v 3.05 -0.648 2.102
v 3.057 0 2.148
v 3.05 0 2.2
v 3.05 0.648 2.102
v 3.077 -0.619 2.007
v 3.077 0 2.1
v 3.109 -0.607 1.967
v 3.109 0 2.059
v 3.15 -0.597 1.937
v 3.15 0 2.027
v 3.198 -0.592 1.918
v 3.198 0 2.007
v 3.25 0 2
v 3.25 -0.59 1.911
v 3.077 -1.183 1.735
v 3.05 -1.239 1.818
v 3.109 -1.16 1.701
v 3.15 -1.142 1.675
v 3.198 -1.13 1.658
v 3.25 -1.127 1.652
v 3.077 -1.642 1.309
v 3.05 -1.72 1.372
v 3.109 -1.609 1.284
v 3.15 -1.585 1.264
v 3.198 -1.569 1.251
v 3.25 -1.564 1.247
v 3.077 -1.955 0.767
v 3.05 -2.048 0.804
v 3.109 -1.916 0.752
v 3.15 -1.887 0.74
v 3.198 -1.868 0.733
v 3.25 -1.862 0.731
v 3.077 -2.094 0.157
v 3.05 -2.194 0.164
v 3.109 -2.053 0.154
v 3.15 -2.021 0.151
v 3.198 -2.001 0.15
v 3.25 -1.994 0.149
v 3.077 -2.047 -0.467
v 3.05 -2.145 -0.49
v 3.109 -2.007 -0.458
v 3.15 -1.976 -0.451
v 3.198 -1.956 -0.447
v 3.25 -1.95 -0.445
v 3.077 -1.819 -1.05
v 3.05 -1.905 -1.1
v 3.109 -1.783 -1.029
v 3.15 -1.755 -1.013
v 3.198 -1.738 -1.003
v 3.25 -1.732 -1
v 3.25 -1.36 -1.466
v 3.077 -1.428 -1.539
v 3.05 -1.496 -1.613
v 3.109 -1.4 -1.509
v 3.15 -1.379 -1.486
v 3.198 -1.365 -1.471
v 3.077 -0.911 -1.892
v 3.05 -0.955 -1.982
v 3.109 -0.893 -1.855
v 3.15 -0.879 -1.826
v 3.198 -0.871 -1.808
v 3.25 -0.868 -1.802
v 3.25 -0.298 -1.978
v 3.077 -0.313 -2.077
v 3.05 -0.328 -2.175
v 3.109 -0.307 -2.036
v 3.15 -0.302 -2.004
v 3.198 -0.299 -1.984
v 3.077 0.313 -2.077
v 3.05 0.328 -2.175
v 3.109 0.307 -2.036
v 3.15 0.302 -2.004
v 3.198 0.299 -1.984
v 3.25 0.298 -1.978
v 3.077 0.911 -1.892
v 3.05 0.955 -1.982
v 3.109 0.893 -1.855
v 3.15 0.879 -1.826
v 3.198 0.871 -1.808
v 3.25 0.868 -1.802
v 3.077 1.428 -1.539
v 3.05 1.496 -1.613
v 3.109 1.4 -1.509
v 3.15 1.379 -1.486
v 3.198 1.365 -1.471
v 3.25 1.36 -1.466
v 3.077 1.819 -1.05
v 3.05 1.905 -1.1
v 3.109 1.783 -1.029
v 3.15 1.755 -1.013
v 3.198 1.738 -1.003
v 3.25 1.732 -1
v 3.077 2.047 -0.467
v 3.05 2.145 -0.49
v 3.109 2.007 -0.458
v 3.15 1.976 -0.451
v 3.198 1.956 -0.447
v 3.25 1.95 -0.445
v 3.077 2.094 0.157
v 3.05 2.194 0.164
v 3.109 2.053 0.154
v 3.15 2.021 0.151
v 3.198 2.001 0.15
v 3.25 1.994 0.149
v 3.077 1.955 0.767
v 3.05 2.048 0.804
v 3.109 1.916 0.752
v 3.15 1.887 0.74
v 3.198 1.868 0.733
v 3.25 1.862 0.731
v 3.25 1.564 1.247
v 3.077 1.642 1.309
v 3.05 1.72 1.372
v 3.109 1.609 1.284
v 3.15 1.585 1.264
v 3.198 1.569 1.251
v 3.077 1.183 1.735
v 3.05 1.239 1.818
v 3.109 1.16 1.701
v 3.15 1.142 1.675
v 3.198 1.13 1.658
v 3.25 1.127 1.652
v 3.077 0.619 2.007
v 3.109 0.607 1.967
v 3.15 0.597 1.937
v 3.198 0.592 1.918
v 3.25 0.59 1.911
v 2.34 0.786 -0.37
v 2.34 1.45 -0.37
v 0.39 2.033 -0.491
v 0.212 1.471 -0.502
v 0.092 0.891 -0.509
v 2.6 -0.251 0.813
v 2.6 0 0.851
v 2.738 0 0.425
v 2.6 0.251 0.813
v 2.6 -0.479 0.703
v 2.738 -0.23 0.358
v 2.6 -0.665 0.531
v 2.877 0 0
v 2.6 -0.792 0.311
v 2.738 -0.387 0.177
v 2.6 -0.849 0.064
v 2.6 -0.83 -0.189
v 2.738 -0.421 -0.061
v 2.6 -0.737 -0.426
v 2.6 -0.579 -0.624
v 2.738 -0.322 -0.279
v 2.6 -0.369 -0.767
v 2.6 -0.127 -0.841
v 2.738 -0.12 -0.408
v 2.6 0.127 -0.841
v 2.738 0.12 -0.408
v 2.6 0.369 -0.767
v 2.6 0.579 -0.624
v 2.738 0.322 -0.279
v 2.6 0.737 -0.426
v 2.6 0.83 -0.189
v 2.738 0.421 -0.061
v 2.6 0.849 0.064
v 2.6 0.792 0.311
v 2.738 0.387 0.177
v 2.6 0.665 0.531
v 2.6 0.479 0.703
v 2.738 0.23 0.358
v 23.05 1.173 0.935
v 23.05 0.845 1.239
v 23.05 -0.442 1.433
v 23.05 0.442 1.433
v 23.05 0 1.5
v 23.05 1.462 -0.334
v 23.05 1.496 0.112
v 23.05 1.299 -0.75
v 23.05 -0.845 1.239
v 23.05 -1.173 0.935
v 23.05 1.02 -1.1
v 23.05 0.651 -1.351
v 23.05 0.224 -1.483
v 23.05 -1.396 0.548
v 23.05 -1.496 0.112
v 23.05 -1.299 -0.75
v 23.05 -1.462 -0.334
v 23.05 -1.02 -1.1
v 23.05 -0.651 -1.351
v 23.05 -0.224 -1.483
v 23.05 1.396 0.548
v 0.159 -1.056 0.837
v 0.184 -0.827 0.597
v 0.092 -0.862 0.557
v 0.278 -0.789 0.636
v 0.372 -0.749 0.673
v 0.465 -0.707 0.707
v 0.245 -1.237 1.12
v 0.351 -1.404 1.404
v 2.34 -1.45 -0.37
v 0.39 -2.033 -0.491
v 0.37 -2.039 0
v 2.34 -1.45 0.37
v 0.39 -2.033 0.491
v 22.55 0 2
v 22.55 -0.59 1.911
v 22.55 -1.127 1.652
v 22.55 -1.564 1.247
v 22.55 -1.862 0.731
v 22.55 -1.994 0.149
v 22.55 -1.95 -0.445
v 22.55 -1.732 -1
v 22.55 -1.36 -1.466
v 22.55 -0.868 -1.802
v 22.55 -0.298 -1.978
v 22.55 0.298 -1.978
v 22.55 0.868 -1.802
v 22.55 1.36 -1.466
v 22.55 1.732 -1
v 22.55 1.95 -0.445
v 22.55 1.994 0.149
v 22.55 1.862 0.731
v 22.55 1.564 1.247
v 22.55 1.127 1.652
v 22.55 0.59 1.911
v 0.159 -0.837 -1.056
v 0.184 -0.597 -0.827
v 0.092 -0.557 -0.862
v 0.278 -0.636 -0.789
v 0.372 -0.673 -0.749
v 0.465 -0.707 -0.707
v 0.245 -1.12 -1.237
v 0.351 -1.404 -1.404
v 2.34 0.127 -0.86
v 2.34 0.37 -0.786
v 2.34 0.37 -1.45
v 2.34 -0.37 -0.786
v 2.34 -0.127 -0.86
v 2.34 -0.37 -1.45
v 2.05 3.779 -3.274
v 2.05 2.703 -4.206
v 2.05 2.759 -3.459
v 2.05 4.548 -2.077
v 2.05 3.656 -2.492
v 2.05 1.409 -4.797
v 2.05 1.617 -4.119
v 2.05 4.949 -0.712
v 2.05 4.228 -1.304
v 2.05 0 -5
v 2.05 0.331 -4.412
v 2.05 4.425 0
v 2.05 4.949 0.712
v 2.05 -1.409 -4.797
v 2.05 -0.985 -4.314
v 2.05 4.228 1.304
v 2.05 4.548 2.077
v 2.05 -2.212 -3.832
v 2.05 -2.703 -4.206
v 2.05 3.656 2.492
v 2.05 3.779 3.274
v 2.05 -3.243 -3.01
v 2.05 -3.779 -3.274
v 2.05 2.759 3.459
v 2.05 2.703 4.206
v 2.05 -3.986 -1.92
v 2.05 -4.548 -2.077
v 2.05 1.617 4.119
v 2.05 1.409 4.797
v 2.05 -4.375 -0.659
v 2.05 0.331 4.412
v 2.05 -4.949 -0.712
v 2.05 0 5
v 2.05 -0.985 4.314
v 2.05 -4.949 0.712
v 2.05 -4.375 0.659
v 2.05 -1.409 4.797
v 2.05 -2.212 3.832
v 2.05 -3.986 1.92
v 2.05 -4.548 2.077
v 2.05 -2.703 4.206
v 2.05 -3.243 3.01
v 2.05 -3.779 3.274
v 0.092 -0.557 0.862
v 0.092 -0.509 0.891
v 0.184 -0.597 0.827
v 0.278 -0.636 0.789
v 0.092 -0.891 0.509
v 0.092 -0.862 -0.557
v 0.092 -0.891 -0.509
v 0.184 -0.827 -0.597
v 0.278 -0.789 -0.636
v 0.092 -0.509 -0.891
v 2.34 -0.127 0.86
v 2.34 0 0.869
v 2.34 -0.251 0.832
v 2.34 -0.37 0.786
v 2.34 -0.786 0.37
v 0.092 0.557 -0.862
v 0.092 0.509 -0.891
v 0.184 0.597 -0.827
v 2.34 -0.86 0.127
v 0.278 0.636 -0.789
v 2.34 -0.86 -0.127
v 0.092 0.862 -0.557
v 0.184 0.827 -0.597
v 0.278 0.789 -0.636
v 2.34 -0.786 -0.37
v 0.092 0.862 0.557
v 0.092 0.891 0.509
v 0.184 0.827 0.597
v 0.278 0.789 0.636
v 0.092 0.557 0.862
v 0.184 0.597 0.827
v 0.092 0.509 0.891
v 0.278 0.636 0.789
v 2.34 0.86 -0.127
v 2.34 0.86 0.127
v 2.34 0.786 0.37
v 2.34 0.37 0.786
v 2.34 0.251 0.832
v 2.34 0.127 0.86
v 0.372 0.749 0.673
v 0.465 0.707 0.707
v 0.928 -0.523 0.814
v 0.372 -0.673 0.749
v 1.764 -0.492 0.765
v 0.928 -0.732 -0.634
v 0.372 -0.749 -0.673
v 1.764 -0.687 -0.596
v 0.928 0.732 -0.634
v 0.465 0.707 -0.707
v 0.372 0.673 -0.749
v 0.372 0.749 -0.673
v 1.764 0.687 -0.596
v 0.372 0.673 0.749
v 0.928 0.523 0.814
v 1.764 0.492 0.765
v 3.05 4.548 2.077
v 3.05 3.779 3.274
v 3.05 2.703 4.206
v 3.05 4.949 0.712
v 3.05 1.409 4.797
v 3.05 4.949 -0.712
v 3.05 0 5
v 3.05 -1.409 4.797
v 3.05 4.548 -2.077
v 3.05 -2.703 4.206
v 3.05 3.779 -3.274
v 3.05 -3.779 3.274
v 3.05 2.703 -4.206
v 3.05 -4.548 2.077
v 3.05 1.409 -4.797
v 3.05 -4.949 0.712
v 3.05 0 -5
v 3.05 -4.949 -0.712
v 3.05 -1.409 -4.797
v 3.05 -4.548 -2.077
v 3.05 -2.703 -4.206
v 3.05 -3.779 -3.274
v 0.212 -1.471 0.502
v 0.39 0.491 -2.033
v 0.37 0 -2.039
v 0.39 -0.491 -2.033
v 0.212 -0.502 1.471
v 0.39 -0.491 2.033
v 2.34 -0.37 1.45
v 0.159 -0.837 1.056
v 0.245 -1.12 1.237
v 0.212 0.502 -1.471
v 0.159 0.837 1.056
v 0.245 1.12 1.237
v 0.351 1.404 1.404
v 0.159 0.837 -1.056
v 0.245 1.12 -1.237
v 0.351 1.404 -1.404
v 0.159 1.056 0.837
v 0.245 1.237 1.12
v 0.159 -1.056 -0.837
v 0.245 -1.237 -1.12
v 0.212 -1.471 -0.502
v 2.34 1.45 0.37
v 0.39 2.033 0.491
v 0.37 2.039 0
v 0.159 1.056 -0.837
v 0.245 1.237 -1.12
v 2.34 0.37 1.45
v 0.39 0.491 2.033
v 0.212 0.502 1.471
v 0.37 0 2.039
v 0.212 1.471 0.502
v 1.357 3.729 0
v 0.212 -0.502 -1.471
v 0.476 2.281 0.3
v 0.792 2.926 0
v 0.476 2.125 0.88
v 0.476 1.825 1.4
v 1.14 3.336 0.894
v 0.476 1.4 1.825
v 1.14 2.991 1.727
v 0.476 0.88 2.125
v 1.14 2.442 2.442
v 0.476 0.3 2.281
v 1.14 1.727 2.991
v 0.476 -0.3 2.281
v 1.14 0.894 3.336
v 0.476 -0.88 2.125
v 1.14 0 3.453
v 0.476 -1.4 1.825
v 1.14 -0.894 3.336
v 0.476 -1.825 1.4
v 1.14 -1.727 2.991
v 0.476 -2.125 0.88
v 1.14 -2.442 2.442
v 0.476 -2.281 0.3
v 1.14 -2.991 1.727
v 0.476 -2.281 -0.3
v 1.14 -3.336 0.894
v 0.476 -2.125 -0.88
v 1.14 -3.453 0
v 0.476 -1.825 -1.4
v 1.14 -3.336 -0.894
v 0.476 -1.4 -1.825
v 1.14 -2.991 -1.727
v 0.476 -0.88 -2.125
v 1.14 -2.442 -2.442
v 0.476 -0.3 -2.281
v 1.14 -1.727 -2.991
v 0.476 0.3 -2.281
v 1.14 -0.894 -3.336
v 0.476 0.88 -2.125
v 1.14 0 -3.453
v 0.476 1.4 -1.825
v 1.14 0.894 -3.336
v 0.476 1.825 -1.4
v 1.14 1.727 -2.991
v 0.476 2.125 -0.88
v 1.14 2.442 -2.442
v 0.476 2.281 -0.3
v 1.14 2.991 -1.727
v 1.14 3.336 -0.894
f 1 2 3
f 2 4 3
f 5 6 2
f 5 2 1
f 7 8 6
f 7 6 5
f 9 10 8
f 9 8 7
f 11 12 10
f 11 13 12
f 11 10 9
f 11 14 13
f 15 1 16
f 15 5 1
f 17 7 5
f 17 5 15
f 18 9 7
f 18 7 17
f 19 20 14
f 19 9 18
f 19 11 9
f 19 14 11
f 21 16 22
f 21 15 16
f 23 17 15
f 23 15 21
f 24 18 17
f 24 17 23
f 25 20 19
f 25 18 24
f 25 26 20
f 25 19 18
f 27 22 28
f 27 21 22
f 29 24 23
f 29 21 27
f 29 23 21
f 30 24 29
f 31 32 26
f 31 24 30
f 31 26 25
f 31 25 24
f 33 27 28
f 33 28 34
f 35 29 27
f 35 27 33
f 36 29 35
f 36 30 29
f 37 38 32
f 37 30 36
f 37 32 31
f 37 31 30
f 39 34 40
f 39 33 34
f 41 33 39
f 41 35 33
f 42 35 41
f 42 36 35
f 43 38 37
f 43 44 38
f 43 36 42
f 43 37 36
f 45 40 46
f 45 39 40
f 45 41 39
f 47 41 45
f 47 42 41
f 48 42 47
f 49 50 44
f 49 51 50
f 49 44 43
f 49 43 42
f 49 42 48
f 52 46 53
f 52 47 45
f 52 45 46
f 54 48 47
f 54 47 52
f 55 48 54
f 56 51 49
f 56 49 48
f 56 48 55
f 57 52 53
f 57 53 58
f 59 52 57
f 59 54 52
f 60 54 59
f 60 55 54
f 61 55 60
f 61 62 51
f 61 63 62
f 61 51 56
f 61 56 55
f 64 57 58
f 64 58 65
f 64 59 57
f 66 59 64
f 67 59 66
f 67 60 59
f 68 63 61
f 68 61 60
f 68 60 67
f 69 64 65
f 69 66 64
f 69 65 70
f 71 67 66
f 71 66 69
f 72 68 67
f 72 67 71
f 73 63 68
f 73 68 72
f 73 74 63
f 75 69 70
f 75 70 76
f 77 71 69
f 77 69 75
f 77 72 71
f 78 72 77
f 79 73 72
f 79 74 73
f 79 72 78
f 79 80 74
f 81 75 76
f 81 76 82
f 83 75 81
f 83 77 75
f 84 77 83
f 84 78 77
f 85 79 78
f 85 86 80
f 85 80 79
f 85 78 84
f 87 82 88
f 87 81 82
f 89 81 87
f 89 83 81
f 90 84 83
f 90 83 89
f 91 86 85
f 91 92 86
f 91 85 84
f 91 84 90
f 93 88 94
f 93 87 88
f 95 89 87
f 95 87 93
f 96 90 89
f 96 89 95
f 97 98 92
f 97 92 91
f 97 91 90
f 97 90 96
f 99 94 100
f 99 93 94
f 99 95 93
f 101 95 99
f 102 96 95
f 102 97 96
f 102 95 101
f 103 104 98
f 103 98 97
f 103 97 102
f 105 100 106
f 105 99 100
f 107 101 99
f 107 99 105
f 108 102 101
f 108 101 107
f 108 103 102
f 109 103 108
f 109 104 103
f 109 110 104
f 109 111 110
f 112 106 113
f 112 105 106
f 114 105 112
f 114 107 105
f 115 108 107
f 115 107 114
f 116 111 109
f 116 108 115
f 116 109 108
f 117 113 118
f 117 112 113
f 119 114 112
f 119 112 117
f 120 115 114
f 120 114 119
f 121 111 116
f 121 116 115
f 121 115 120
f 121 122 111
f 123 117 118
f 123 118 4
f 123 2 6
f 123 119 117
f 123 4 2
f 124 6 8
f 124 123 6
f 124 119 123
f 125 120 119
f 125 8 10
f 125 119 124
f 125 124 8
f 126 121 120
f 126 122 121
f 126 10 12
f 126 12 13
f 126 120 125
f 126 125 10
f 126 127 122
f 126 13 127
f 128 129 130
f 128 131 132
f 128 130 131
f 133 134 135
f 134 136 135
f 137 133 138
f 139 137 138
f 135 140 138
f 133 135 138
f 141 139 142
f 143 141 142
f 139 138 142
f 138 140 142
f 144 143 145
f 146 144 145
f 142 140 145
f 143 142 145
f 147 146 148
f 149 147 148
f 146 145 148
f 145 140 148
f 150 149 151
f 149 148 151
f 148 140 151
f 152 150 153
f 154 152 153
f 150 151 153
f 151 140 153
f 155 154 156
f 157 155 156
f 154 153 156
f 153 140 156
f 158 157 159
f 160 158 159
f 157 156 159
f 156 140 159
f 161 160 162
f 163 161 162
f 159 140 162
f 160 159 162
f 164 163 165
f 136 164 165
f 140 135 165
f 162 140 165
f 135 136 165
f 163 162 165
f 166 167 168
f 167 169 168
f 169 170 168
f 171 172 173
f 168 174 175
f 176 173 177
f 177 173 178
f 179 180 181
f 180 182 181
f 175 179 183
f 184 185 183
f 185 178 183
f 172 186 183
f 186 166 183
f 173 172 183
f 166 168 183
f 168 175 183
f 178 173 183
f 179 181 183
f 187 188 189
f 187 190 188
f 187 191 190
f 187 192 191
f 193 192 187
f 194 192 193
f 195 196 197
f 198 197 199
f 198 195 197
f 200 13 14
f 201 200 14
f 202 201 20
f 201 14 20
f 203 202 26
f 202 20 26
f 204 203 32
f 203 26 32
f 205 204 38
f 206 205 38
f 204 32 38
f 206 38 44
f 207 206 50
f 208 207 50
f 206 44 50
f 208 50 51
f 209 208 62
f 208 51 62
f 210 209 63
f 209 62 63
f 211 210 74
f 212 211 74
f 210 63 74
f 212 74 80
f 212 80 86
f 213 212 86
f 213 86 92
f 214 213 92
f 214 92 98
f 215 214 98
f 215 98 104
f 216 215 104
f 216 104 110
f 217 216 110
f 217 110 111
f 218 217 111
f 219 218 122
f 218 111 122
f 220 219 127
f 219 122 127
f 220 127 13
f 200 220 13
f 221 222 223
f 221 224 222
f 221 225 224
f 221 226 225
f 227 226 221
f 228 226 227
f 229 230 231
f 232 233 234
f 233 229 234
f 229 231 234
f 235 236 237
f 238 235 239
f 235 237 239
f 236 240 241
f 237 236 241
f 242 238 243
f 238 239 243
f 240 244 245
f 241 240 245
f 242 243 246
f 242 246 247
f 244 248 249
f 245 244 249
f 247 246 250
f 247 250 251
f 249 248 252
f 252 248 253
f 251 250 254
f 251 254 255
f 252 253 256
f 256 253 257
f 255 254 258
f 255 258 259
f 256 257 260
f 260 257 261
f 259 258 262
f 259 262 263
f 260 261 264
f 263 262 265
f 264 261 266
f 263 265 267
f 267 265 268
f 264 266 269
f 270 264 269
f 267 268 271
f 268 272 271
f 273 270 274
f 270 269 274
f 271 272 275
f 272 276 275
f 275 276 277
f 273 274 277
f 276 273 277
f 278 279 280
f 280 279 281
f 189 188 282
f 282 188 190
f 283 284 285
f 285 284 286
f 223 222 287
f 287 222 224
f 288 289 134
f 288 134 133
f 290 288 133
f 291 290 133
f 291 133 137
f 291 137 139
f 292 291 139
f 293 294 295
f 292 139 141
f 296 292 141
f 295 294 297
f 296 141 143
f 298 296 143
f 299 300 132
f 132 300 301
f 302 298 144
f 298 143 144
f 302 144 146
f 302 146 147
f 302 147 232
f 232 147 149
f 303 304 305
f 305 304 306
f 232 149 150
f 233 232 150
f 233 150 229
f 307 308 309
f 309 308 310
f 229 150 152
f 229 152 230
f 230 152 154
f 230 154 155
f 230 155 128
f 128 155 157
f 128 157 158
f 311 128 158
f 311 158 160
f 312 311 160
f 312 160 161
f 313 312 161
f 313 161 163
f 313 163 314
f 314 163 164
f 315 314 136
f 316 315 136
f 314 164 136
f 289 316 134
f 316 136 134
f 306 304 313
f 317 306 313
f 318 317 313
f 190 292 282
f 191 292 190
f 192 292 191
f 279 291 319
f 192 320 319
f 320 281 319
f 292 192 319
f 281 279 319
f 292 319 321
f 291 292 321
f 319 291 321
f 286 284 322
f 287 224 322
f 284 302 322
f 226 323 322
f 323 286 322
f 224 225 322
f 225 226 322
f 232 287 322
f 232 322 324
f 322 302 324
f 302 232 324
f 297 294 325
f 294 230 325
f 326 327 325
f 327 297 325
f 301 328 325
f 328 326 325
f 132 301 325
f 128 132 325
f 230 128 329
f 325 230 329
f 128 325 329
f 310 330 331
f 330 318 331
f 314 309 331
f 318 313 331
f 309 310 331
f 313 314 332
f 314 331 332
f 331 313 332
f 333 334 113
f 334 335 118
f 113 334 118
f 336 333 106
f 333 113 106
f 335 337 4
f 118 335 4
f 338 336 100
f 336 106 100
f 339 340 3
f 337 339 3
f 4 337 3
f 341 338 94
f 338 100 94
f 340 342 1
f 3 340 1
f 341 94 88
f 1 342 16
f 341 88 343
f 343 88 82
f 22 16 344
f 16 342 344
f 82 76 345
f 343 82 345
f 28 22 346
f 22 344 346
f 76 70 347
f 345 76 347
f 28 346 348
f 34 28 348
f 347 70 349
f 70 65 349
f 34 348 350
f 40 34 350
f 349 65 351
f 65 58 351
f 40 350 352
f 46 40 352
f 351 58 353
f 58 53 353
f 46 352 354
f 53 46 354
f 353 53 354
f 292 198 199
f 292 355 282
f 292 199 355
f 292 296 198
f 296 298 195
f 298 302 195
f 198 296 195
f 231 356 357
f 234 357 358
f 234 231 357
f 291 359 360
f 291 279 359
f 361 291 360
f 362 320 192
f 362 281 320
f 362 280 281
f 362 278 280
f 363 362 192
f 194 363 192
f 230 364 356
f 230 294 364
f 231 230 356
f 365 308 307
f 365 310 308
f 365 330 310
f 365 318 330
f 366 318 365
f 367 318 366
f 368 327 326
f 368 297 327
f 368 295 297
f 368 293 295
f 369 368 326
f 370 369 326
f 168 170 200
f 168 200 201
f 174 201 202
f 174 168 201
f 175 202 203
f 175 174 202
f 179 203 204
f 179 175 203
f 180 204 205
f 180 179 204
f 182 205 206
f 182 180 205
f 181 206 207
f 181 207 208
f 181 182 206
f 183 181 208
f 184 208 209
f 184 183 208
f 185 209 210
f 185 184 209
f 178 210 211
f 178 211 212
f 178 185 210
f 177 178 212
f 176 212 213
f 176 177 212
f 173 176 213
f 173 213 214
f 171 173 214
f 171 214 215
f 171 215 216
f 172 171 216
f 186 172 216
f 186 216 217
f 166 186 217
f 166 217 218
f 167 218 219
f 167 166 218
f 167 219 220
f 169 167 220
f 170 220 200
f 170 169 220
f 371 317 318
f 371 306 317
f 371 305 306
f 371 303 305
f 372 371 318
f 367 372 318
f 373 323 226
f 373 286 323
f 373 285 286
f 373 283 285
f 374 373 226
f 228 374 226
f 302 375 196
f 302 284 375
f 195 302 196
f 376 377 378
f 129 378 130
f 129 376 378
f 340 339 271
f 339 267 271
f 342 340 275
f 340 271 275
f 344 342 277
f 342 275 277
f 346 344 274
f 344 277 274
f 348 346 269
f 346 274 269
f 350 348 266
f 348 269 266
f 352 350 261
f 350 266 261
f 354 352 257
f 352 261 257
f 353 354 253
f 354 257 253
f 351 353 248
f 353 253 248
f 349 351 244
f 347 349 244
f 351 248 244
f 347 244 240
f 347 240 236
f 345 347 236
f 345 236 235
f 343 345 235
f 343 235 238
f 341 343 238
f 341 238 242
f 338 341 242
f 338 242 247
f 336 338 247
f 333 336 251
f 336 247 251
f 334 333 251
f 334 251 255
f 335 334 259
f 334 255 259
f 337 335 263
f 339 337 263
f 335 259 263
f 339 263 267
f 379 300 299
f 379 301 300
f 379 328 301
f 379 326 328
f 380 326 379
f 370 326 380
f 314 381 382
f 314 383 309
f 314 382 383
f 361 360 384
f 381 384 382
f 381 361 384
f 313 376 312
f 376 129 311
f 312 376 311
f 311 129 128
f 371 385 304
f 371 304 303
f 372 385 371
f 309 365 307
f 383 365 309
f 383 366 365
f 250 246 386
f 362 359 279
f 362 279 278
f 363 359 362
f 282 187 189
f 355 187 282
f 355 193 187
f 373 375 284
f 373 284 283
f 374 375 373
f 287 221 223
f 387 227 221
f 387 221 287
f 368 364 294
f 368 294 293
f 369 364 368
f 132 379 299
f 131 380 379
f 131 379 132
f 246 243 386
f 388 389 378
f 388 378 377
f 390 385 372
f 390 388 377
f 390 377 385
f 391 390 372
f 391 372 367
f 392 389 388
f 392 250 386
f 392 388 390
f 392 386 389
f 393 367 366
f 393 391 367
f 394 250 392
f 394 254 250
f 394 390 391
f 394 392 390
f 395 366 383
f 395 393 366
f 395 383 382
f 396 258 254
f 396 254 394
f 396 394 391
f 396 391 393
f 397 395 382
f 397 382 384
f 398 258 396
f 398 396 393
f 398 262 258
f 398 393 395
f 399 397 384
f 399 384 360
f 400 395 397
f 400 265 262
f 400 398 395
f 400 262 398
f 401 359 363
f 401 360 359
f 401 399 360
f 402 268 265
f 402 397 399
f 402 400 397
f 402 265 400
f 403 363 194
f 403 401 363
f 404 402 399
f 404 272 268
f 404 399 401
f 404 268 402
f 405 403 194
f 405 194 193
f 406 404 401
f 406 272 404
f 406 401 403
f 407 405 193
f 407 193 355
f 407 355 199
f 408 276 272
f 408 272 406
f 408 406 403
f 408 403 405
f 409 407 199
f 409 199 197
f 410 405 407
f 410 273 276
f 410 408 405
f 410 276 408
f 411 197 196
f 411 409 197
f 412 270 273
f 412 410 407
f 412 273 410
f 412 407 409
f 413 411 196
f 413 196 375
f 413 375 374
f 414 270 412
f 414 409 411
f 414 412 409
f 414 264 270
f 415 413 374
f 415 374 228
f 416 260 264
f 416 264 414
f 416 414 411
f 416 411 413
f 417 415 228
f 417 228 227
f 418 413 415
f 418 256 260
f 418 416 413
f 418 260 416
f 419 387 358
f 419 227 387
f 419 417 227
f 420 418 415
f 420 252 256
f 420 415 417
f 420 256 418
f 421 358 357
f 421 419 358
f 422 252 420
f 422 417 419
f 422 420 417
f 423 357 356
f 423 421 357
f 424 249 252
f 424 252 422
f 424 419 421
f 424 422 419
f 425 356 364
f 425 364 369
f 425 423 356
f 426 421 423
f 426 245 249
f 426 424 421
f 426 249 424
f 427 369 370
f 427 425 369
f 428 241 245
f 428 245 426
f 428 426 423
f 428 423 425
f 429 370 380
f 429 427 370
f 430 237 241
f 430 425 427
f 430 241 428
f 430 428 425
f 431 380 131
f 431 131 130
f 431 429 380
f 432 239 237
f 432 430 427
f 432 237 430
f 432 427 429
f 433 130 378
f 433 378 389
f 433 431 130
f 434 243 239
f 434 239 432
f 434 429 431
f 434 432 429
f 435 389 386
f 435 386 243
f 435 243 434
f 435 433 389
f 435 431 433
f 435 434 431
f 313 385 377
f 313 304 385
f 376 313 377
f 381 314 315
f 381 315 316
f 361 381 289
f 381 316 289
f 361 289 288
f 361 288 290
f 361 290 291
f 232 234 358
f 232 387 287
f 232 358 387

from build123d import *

# Parameters (mm, degrees)
FILLET1_R             = 0.2
RECPAT_COUNT          = 2
RECPAT_ANGLE          = 90
CHAMFER_1_SIZE        = 0.5
CUT_EXTRUDE_START     = -1.932317225
CUT_EXTRUDE_1_DEPTH   = 0.992538955
CUT_EXTRUDE_1_2_DEPTH = 0.992538955
CUT_EXTRUDE_1_3_DEPTH = 0.992538955
CUT_EXTRUDE_1_4_DEPTH = 0.992538955


# Read off the part's stored shape, not the designer's step: Вытянуть1
with BuildPart() as part:
    # BodySke → Base-Revolve (revolve)
    with BuildSketch(Plane.XY, mode=Mode.PRIVATE) as base_revolve_sk:
        Polygon((3.05, 2), (3.05, 5), (2.05, 5), (2.05, 0), (23.05, 0), (23.05, 2), align=None)
    revolve(base_revolve_sk.sketch.rotate(Axis((-6.35, 0, 0), (1, 0, 0)), 90), axis=Axis((-6.35, 0, 0), (1, 0, 0)))

    # Fillet1
    fillet1_edges = [part.edges().sort_by_distance(p)[0] for p in [
        (3.05, 0, -2),
    ]]
    fillet(fillet1_edges, radius=FILLET1_R)

    # PanSke → Pan (revolve)
    with BuildSketch(Plane.XY):
        with BuildLine():
            Line((2.05, 4.424646879), (2.05, 0))
            Line((2.05, 0), (0, 0))
            ThreePointArc((0, 0), (0.537396082, 2.438237068), (2.05, 4.424646879))
        make_face()
    revolve(axis=Axis((0, 0, 0), (1, 0, 0)))

    # Sketch3 → Recess section 0
    with BuildSketch(Plane(origin=(0, 0, 0), x_dir=(0, 0, -1), z_dir=(1, 0, 0))):
        with BuildLine():
            Line((-0.515, 2.15), (0.515, 2.15))
            Line((0.515, 2.15), (0.515, -2.15))
            Line((0.515, -2.15), (-0.515, -2.15))
            Line((-0.515, -2.15), (-0.515, 2.15))
        make_face()
    # Sketch4 → Recess section 1
    with BuildSketch(Plane(origin=(2.34, 0, 0), x_dir=(0, 0, -1), z_dir=(1, 0, 0))):
        with BuildLine():
            Line((-0.37, 1.45), (0.37, 1.45))
            Line((0.37, 1.45), (0.37, -1.45))
            Line((0.37, -1.45), (-0.37, -1.45))
            Line((-0.37, -1.45), (-0.37, 1.45))
        make_face()
    recess = loft(mode=Mode.SUBTRACT)

    # RecPat: Recess ×2 about axis
    recpat_axis = Axis((0, 0, 0), (1, 0, 0))
    for i in range(1, RECPAT_COUNT):
        add(recess.rotate(recpat_axis, i * RECPAT_ANGLE / (RECPAT_COUNT - 1)), mode=Mode.SUBTRACT)

    # RecCorSke → RecessCore (revolve, cut)
    with BuildSketch(Plane.XY, mode=Mode.PRIVATE) as recesscore_sk:
        Polygon((0, 0), (0, 1.032809711), (2.6, 0.851), (2.876506661, 0), align=None)
    revolve(recesscore_sk.sketch.rotate(Axis((-3.175, 0, 0), (1, 0, 0)), 90), axis=Axis((-3.175, 0, 0), (1, 0, 0)), mode=Mode.SUBTRACT)

    # Фаска1
    chamfer_1_edges = [part.edges().sort_by_distance(p)[0] for p in [
        (23.05, 0, -2),
    ]]
    chamfer(chamfer_1_edges, length=CHAMFER_1_SIZE)

    # Вытянуть1 outline → Вытянуть1 (cut)
    with BuildSketch(Plane(origin=(0, 0, 0), x_dir=(0.9932989193126689, -0.08172287590474257, -0.08172287590474261), z_dir=(0.1155735994606204, 0.7023684015912574, 0.7023684015912578)).offset(CUT_EXTRUDE_START)):
        Polygon((-1, -0.919204654), (0.206895578, -0.216114133), (0.577867997, 0), (0.206895578, 0.216114133), (-1, 0.919204654), align=None)
    extrude(amount=CUT_EXTRUDE_1_DEPTH, mode=Mode.SUBTRACT)

    # Cut-Extrude 1 2 outline → Cut-Extrude 1 2 (cut)
    with BuildSketch(Plane(origin=(0, 0, 0), x_dir=(0.9932989193126689, -0.08172287590474257, 0.08172287590474261), z_dir=(0.1155735994606204, 0.7023684015912574, -0.7023684015912578)).offset(CUT_EXTRUDE_START)):
        Polygon((0.206895578, -0.216114133), (0.577867997, 0), (0.206895578, 0.216114133), (-1, 0.919204654), (-1, -0.919204654), align=None)
    extrude(amount=CUT_EXTRUDE_1_2_DEPTH, mode=Mode.SUBTRACT)

    # Cut-Extrude 1 3 outline → Cut-Extrude 1 3 (cut)
    with BuildSketch(Plane(origin=(0, 0, 0), x_dir=(0.9932989193126689, 0.08172287590474257, 0.08172287590474261), z_dir=(0.1155735994606204, -0.7023684015912574, -0.7023684015912578)).offset(CUT_EXTRUDE_START)):
        Polygon((0.206895578, -0.216114133), (0.577867997, 0), (0.206895578, 0.216114133), (-1, 0.919204654), (-1, -0.919204654), align=None)
    extrude(amount=CUT_EXTRUDE_1_3_DEPTH, mode=Mode.SUBTRACT)

    # Cut-Extrude 1 4 outline → Cut-Extrude 1 4 (cut)
    with BuildSketch(Plane(origin=(0, 0, 0), x_dir=(0.9932989193126689, 0.08172287590474257, -0.08172287590474261), z_dir=(0.1155735994606204, -0.7023684015912574, 0.7023684015912578)).offset(CUT_EXTRUDE_START)):
        Polygon((-1, -0.919204654), (0.206895578, -0.216114133), (0.577867997, 0), (0.206895578, 0.216114133), (-1, 0.919204654), align=None)
    extrude(amount=CUT_EXTRUDE_1_4_DEPTH, mode=Mode.SUBTRACT)


solid = part.part
